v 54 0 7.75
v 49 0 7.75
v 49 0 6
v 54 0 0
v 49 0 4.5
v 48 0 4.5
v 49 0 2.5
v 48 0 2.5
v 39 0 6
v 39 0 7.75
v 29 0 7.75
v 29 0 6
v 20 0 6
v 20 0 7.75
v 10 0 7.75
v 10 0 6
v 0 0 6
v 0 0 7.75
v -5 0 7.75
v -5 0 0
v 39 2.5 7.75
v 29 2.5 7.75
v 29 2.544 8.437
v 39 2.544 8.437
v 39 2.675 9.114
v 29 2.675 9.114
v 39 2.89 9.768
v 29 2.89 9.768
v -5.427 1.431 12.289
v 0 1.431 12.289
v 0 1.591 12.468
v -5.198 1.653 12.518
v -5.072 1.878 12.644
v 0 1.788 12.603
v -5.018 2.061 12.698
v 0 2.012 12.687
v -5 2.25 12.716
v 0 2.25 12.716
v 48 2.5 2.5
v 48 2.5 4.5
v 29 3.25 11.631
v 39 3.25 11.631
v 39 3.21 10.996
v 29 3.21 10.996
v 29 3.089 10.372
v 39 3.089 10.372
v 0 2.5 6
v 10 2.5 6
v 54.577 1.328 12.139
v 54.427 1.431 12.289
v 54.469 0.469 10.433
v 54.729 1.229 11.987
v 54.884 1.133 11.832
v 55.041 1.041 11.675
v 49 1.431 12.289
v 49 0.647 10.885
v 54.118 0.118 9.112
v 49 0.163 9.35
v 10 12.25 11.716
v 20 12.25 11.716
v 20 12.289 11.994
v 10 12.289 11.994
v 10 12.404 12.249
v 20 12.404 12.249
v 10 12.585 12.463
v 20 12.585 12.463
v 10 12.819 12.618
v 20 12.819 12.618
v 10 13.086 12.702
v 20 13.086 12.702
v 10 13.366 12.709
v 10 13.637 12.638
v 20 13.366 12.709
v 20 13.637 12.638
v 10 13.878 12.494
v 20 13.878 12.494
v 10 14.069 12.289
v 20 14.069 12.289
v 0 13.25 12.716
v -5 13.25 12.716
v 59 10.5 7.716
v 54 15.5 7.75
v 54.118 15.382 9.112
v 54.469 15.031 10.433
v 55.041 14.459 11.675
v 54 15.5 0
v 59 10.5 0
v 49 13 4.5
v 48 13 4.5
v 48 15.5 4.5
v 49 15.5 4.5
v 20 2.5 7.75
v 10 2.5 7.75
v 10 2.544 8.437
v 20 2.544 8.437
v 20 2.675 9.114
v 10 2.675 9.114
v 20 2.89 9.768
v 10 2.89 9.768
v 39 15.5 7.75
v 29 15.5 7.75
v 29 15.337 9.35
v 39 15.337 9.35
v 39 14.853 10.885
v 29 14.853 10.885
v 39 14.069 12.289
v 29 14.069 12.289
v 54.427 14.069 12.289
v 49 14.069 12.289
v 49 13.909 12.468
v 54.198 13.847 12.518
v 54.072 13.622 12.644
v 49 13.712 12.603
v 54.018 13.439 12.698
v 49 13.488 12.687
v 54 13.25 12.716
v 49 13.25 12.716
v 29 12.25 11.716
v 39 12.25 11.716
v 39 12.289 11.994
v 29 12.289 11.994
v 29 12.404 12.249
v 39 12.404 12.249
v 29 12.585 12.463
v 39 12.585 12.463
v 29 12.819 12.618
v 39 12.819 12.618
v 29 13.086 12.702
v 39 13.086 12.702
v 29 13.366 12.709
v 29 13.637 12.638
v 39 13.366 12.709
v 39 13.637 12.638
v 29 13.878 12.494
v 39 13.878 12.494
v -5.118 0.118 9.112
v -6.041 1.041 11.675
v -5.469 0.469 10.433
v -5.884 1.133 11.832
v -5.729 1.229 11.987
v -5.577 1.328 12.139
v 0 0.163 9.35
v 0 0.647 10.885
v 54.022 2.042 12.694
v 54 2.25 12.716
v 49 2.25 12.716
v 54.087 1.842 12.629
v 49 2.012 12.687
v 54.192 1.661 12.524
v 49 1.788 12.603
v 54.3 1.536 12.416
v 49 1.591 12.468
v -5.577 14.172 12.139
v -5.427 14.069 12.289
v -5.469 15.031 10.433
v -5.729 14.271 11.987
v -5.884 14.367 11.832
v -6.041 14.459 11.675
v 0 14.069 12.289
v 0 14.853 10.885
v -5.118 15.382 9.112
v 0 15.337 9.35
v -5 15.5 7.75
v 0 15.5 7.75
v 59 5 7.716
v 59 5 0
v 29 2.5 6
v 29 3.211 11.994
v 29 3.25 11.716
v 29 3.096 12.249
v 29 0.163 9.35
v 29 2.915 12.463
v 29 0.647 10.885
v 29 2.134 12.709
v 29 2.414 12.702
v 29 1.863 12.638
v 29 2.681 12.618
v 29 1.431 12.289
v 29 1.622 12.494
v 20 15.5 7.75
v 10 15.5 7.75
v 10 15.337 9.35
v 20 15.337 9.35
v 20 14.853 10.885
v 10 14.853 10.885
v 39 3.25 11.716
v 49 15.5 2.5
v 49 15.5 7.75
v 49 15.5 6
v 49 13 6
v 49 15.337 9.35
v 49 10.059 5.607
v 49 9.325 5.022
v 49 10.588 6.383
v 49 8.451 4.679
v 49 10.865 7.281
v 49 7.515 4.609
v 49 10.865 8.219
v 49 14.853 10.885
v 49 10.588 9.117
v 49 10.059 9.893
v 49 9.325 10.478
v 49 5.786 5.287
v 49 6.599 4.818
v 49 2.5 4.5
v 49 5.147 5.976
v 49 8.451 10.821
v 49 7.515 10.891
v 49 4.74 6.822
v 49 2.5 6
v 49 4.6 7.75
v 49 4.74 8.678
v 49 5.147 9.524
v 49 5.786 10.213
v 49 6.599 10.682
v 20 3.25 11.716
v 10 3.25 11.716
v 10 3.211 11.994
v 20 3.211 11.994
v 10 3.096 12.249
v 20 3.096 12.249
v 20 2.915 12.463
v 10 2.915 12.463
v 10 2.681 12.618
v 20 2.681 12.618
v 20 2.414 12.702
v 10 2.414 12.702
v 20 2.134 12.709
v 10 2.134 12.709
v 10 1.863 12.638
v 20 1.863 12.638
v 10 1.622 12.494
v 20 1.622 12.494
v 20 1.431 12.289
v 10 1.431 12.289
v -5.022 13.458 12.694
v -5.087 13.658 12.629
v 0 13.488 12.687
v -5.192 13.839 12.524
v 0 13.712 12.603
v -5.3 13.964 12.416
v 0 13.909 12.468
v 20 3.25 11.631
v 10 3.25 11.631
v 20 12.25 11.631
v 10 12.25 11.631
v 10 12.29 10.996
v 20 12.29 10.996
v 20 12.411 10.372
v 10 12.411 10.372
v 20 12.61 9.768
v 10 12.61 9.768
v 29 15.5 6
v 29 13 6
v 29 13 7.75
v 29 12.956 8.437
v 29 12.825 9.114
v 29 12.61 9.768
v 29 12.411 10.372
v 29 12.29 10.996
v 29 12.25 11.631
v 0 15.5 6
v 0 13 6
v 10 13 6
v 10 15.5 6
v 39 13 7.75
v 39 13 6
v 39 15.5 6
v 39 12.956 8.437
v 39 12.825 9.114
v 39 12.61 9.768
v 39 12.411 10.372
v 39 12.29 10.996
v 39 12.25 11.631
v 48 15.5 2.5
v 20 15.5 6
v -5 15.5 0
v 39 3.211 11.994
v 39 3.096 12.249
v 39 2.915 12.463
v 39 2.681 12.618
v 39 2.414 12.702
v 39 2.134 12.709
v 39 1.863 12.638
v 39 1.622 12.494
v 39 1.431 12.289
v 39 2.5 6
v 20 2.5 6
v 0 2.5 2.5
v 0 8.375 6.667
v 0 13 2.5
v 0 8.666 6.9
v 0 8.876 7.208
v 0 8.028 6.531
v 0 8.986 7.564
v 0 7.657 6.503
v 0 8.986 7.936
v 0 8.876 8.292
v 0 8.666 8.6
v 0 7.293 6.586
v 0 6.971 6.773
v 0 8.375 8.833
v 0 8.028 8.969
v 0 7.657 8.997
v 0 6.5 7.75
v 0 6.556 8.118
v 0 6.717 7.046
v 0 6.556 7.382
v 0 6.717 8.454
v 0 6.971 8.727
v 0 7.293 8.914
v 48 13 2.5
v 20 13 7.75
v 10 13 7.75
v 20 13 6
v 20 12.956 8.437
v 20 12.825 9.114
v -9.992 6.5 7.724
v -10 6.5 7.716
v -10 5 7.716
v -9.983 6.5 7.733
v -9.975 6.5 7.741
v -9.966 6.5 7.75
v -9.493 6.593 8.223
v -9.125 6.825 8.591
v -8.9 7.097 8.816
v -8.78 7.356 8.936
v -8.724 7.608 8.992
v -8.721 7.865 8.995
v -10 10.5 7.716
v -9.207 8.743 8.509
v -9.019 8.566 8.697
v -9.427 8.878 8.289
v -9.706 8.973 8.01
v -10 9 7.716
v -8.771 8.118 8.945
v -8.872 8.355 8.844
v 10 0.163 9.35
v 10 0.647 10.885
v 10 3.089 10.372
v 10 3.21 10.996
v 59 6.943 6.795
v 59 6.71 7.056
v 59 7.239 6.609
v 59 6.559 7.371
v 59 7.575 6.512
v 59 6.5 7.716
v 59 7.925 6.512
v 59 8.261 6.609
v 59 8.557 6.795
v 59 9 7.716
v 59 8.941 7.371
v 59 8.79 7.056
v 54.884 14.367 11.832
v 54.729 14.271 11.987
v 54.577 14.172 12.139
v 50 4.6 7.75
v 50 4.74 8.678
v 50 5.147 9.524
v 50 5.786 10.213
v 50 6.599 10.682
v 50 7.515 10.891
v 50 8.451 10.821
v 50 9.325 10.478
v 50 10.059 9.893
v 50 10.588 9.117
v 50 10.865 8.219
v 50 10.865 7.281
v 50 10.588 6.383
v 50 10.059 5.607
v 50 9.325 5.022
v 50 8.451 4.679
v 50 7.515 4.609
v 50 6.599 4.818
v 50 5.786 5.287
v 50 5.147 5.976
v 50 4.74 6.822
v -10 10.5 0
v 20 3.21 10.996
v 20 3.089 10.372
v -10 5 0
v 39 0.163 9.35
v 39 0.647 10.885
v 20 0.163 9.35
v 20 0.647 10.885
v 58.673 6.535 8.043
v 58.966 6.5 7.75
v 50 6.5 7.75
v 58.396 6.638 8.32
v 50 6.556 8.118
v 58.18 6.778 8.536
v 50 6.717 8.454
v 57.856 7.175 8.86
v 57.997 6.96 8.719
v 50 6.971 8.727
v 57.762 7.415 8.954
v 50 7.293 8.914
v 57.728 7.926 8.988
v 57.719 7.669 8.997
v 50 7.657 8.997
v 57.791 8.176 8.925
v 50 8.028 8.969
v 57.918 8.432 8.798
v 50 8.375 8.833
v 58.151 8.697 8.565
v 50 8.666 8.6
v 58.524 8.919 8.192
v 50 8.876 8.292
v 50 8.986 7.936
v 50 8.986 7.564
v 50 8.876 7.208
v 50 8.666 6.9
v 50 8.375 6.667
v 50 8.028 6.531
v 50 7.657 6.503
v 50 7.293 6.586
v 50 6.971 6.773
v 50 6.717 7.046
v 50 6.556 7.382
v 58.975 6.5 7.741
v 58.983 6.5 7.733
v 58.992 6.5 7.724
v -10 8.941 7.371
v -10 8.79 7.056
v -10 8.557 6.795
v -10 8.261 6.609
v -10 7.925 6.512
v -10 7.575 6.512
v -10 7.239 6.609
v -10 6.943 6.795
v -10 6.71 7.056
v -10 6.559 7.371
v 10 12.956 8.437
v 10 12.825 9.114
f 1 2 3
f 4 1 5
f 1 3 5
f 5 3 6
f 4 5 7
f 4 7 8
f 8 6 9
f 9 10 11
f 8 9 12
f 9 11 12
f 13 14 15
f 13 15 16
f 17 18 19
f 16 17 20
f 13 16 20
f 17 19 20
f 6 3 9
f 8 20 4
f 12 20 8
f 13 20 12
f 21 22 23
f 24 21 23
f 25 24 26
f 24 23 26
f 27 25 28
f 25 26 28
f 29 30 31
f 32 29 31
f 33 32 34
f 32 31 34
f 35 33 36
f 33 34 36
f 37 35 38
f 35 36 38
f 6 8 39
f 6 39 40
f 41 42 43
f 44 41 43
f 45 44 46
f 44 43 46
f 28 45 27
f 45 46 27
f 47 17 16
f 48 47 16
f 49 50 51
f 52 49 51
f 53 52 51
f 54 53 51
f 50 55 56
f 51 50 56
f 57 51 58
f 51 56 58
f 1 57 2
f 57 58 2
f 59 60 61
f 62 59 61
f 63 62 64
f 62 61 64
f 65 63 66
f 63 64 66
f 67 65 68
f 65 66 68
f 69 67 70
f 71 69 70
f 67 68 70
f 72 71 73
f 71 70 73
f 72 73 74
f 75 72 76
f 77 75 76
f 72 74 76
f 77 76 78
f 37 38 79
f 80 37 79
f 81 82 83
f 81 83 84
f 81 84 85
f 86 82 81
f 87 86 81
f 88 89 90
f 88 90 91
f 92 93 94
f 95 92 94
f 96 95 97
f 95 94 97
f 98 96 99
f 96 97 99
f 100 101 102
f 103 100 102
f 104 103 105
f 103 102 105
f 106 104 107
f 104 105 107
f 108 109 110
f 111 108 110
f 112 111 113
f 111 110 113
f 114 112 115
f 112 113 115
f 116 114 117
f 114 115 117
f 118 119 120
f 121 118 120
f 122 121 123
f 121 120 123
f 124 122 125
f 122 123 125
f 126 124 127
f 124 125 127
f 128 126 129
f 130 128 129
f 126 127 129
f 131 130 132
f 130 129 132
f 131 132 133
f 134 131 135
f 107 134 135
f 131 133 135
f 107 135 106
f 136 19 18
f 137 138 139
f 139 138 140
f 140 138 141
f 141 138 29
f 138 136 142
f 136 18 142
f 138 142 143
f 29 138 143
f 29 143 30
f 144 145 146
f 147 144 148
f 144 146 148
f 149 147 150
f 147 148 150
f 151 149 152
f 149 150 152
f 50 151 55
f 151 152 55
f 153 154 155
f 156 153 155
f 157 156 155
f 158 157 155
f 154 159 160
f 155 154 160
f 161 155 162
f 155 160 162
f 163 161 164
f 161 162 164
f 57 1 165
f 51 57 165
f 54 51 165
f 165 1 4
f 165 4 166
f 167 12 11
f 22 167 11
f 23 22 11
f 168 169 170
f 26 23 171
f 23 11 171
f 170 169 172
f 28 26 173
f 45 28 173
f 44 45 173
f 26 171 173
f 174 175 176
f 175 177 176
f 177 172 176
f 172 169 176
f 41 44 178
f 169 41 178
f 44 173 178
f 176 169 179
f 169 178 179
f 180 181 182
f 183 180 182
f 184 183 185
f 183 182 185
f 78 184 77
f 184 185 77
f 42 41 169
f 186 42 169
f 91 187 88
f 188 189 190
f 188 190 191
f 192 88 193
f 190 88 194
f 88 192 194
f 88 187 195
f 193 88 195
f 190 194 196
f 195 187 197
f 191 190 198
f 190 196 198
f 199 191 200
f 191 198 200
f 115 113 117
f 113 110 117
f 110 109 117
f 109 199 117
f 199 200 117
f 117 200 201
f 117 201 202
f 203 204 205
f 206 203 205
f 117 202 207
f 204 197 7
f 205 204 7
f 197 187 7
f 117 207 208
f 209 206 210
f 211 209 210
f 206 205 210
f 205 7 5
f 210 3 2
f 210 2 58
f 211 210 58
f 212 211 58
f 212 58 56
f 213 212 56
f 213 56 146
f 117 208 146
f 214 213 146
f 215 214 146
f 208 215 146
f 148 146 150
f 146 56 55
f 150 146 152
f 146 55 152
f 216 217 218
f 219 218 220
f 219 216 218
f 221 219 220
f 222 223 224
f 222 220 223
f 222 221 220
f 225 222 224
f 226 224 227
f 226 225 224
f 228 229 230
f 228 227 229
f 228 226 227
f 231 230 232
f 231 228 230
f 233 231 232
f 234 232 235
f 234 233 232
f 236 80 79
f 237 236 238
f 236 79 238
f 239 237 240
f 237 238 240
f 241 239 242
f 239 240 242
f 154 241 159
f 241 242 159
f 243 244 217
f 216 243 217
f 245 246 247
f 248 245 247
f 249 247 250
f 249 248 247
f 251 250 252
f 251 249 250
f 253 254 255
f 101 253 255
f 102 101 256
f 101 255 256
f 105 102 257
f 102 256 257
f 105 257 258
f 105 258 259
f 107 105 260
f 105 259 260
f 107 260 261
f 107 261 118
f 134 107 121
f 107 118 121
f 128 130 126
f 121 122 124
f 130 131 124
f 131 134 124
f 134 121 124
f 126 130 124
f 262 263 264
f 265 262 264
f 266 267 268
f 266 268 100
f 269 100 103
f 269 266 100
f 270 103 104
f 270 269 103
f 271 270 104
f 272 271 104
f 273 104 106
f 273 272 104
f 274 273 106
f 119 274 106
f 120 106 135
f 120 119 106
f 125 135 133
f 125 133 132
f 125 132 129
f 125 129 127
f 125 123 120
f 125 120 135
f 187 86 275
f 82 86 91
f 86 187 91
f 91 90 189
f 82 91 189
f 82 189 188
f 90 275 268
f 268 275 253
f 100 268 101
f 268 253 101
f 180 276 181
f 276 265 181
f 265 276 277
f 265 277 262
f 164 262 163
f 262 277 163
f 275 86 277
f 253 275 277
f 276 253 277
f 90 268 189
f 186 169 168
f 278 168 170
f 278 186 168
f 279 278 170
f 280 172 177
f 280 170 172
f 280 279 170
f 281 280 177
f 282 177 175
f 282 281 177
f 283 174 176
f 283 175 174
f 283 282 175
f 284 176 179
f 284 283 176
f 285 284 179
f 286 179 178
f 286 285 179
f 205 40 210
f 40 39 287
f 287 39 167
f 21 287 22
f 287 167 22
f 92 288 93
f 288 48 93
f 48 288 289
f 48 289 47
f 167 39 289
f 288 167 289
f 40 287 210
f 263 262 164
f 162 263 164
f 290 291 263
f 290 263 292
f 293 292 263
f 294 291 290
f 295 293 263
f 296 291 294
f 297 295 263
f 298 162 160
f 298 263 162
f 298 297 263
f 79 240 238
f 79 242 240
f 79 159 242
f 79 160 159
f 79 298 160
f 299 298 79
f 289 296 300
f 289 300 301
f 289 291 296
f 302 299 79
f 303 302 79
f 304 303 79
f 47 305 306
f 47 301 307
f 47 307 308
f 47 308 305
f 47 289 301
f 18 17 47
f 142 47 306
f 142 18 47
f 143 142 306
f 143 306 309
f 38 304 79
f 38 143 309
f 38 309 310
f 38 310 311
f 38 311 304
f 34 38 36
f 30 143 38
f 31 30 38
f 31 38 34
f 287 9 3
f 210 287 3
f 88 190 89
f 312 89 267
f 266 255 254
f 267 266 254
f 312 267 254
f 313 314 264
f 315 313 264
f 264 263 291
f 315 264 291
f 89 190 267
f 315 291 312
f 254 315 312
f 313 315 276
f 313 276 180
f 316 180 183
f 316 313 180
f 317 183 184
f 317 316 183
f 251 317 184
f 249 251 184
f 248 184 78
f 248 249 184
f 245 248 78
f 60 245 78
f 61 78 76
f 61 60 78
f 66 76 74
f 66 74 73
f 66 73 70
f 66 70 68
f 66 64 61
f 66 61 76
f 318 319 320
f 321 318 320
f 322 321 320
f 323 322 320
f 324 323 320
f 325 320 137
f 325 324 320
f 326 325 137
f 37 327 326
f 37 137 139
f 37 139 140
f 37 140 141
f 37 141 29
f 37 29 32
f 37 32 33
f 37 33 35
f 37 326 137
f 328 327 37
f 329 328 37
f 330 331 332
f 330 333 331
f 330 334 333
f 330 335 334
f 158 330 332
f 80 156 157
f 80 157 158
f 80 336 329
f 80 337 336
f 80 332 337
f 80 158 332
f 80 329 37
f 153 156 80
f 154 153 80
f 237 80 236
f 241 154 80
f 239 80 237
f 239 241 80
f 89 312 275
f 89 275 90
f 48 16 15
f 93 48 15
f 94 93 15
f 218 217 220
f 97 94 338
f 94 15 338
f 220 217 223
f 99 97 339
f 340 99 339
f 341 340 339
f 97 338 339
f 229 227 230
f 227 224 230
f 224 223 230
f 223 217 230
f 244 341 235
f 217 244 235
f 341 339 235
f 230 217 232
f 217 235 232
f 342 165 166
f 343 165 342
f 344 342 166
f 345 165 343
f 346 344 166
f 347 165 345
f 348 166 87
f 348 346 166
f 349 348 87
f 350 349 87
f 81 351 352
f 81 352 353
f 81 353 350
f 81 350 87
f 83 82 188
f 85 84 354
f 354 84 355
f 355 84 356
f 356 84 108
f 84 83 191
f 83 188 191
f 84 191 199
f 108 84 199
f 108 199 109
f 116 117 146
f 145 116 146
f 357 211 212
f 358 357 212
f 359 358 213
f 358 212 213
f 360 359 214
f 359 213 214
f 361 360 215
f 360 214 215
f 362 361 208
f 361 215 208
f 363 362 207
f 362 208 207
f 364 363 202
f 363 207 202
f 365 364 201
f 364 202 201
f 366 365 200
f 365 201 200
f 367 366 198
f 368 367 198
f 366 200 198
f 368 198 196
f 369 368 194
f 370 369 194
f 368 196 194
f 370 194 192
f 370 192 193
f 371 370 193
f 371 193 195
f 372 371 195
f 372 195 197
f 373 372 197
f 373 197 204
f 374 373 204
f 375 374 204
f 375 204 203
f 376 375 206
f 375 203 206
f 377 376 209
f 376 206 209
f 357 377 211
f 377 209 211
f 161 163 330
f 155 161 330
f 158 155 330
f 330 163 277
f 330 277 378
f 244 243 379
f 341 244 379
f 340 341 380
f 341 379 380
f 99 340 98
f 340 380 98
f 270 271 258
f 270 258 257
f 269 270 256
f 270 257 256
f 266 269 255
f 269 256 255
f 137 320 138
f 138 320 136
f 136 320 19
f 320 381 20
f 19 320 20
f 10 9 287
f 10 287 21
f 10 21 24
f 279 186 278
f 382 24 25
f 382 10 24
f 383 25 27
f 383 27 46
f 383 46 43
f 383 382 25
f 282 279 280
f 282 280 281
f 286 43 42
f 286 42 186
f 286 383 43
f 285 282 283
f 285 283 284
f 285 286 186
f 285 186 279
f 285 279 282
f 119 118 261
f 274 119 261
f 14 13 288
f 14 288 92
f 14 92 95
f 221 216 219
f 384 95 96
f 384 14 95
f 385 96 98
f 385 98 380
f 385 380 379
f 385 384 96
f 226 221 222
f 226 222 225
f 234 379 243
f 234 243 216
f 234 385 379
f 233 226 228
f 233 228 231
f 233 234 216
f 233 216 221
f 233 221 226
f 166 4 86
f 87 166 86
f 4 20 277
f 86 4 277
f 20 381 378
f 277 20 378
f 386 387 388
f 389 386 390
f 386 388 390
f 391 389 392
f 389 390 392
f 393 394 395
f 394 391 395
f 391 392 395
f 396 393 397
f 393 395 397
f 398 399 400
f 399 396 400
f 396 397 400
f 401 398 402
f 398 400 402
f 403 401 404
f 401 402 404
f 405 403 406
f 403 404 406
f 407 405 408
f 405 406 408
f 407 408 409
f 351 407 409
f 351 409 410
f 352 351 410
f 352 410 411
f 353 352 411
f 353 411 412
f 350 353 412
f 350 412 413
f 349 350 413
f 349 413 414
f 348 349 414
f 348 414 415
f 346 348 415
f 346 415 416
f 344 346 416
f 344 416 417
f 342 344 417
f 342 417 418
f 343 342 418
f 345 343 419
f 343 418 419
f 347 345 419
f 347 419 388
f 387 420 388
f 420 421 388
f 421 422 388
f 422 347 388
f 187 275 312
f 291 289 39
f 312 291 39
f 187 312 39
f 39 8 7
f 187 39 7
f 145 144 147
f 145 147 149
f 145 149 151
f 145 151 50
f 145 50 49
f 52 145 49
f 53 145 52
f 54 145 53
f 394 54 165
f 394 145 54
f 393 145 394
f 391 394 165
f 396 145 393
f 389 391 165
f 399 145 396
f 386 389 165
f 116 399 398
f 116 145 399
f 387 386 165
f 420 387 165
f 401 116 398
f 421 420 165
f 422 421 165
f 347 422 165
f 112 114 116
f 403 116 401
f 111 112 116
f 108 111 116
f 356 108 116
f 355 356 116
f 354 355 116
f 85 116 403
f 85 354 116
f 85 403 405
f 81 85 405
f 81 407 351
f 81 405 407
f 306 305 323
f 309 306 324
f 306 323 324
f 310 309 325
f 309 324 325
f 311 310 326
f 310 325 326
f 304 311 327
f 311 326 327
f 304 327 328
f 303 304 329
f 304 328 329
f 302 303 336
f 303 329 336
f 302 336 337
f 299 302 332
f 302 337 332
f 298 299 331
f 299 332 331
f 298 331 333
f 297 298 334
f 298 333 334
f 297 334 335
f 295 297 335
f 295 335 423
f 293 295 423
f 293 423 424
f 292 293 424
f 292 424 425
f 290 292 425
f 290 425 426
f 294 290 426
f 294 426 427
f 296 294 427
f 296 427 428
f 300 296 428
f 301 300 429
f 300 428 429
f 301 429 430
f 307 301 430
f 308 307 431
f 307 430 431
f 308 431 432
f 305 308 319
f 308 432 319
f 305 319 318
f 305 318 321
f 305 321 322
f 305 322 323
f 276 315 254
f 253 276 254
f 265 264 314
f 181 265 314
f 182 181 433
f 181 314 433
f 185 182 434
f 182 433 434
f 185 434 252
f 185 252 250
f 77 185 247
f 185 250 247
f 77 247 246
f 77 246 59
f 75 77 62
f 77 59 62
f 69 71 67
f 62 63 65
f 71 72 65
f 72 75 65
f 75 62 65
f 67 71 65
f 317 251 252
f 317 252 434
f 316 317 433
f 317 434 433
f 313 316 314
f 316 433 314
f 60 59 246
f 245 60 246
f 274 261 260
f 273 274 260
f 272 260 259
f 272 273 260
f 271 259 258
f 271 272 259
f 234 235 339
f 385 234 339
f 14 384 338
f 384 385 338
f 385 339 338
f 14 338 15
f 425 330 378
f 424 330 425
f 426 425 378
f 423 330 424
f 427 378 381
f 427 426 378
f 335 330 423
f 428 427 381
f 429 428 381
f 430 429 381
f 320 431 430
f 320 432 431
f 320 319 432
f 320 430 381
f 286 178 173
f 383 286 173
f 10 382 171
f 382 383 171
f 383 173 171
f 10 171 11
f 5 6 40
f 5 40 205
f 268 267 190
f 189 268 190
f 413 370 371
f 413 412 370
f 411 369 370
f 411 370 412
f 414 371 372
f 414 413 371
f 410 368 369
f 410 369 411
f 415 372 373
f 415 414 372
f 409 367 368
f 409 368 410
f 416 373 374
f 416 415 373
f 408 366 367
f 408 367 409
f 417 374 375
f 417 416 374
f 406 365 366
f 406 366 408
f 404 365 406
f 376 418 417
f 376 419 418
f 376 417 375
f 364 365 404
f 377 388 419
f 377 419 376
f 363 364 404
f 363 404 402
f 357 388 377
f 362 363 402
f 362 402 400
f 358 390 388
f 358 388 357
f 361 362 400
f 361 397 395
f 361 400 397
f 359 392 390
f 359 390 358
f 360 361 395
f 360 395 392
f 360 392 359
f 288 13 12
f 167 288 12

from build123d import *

# Parameters (mm, degrees)
F0_W         = 49
F0_H         = 15.5
F1_DEPTH     = 2.5
F3_DEPTH     = 49
F4_R         = 1
F5_R         = 5
F7_DEPTH     = 10
F9_DEPTH     = 10
F10_W        = 10
F10_H        = 6.7160013448
F10_W_2      = 9
F11_DEPTH    = 15.501
F12_T1_DEPTH = 36.7168298797
F12_T3_DEPTH = 33.4668298797
F13_R        = 1.25
F14_DEPTH    = 69.001
F15_W        = 1
F15_H        = 2
F16_DEPTH    = 15.501
F17_R        = 3.15
F18_DEPTH    = 1


# Not quite as in the source:
# - a fillet or chamfer that OpenCascade refuses, or shapes differently, is made with other operations: its cross-section is extruded or revolved along the edge and cut away or added


with BuildPart() as f1:
    # F0 (on Top) → F1 (new body)
    with BuildSketch(Plane.XY):
        with Locations((24.5, 7.75)):
            Rectangle(F0_W, F0_H)
    extrude(amount=F1_DEPTH)

    # F2 (on Right) → F3 (join, through all)
    with BuildSketch(Plane.YZ):
        with BuildLine():
            Line((0, 7.75), (0, 2.5))
            Line((0, 2.5), (2.5, 2.5))
            Line((2.5, 2.5), (2.5, 7.75))
            ThreePointArc((2.5, 7.75), (2.690862635, 9.1752192814), (3.25, 10.5))
            Line((3.25, 10.5), (3.25, 14.1449850143))
            ThreePointArc((3.25, 14.1449850143), (0.859115549, 11.3367232028), (0, 7.75))
        make_face()
        with BuildLine():
            Line((13, 7.75), (13, 2.5))
            Line((13, 2.5), (15.5, 2.5))
            Line((15.5, 2.5), (15.5, 7.75))
            ThreePointArc((15.5, 7.75), (14.640884451, 11.3367232028), (12.25, 14.1449850143))
            Line((12.25, 14.1449850143), (12.25, 10.5))
            ThreePointArc((12.25, 10.5), (12.809137365, 9.1752192814), (13, 7.75))
        make_face()
    extrude(amount=F3_DEPTH)

    # F4
    f4_edges = [f1.edges().sort_by_distance(p)[0] for p in [
        (24.5, 12.25, 14.144985),
        (24.5, 3.25, 14.144985),
    ]]
    fillet(f4_edges, radius=F4_R)

    # F5
    f5_edges = [f1.edges().sort_by_distance(p)[0] for p in [
        (24.5, 12.25, 10.5),
        (24.5, 3.25, 10.5),
    ]]
    fillet(f5_edges, radius=F5_R)

    # F6 (on face) → F7 (join)
    with BuildSketch(Plane(origin=(0, 0, 0), x_dir=(0, -1, 0), z_dir=(-1, 0, 0))):
        with BuildLine():
            ThreePointArc((-14.0692771084, 12.2893991295), (-15.1338520571, 10.1297642977), (-15.5, 7.75))
            Line((-15.5, 7.75), (-15.5, 0))
            Line((-15.5, 0), (0, 0))
            Line((0, 0), (0, 7.75))
            ThreePointArc((0, 7.75), (-0.3661479429, 10.1297642977), (-1.4307228916, 12.2893991295))
            ThreePointArc((-1.4307228916, 12.2893991295), (-1.7881546713, 12.6029618244), (-2.25, 12.7160013448))
            Line((-2.25, 12.7160013448), (-13.25, 12.7160013448))
            ThreePointArc((-13.25, 12.7160013448), (-13.7118453287, 12.6029618244), (-14.0692771084, 12.2893991295))
        make_face()
    extrude(amount=F7_DEPTH)

    # F8 (on face) → F9 (join)
    with BuildSketch(Plane.YZ.offset(49)):
        with BuildLine():
            Line((15.5, 0), (15.5, 7.75))
            ThreePointArc((15.5, 7.75), (15.1338520571, 10.1297642977), (14.0692771084, 12.2893991295))
            ThreePointArc((14.0692771084, 12.2893991295), (13.7118453287, 12.6029618244), (13.25, 12.7160013448))
            Line((13.25, 12.7160013448), (2.25, 12.7160013448))
            ThreePointArc((2.25, 12.7160013448), (1.7881546713, 12.6029618244), (1.4307228916, 12.2893991295))
            ThreePointArc((1.4307228916, 12.2893991295), (0.3661479429, 10.1297642977), (0, 7.75))
            Line((0, 7.75), (0, 0))
            Line((0, 0), (15.5, 0))
        make_face()
    extrude(amount=F9_DEPTH)

    # F10 (on face) → F11 (cut, through all)
    with BuildSketch(Plane.XZ):
        with Locations((44, 9.3580006724)):
            Rectangle(F10_W, F10_H)
        with Locations((24.5, 9.3580006724)):
            Rectangle(F10_W_2, F10_H)
        with Locations((5, 9.3580006724)):
            Rectangle(F10_W, F10_H)
    extrude(amount=-F11_DEPTH, mode=Mode.SUBTRACT)

    # F12: chamfer of 5 on 6 edges, made by hand

    # F12_s2 → F12_t1 (cut)
    with BuildSketch(Plane.XZ.offset(-26.1084149398)):
        Polygon((-10, 7.7160013448), (-5, 12.7160013448), (-10, 12.7160013448), align=None)
        Polygon((54, 12.7160013448), (59, 7.7160013448), (59, 12.7160013448), align=None)
    extrude(amount=F12_T1_DEPTH, mode=Mode.SUBTRACT)

    # F12_s4 → F12_t3 (cut)
    with BuildSketch(Plane.XY.offset(-12.8584149398)):
        Polygon((-10, 5), (-5, 0), (-10, 0), align=None)
        Polygon((-5, 15.5), (-10, 10.5), (-10, 15.5), align=None)
        Polygon((54, 0), (59, 5), (59, 0), align=None)
        Polygon((54, 15.5), (59, 10.5), (59, 15.5), align=None)
    extrude(amount=F12_T3_DEPTH, mode=Mode.SUBTRACT)

    # F13 (on face) → F14 (cut, through all)
    with BuildSketch(Plane(origin=(-10, 0, 0), x_dir=(0, -1, 0), z_dir=(-1, 0, 0))):
        with Locations((-7.75, 7.75)):
            Circle(F13_R)
    extrude(amount=-F14_DEPTH, mode=Mode.SUBTRACT)

    # F15 (on face) → F16 (cut, through all)
    with BuildSketch(Plane.XZ):
        with Locations((48.5, 3.5)):
            Rectangle(F15_W, F15_H)
    extrude(amount=-F16_DEPTH, mode=Mode.SUBTRACT)

    # F17 (on face) → F18 (cut)
    with BuildSketch(Plane(origin=(49, 0, 0), x_dir=(0, -1, 0), z_dir=(-1, 0, 0))):
        with Locations((-7.75, 7.75)):
            Circle(F17_R)
    extrude(amount=-F18_DEPTH, mode=Mode.SUBTRACT)


solid = f1.part
